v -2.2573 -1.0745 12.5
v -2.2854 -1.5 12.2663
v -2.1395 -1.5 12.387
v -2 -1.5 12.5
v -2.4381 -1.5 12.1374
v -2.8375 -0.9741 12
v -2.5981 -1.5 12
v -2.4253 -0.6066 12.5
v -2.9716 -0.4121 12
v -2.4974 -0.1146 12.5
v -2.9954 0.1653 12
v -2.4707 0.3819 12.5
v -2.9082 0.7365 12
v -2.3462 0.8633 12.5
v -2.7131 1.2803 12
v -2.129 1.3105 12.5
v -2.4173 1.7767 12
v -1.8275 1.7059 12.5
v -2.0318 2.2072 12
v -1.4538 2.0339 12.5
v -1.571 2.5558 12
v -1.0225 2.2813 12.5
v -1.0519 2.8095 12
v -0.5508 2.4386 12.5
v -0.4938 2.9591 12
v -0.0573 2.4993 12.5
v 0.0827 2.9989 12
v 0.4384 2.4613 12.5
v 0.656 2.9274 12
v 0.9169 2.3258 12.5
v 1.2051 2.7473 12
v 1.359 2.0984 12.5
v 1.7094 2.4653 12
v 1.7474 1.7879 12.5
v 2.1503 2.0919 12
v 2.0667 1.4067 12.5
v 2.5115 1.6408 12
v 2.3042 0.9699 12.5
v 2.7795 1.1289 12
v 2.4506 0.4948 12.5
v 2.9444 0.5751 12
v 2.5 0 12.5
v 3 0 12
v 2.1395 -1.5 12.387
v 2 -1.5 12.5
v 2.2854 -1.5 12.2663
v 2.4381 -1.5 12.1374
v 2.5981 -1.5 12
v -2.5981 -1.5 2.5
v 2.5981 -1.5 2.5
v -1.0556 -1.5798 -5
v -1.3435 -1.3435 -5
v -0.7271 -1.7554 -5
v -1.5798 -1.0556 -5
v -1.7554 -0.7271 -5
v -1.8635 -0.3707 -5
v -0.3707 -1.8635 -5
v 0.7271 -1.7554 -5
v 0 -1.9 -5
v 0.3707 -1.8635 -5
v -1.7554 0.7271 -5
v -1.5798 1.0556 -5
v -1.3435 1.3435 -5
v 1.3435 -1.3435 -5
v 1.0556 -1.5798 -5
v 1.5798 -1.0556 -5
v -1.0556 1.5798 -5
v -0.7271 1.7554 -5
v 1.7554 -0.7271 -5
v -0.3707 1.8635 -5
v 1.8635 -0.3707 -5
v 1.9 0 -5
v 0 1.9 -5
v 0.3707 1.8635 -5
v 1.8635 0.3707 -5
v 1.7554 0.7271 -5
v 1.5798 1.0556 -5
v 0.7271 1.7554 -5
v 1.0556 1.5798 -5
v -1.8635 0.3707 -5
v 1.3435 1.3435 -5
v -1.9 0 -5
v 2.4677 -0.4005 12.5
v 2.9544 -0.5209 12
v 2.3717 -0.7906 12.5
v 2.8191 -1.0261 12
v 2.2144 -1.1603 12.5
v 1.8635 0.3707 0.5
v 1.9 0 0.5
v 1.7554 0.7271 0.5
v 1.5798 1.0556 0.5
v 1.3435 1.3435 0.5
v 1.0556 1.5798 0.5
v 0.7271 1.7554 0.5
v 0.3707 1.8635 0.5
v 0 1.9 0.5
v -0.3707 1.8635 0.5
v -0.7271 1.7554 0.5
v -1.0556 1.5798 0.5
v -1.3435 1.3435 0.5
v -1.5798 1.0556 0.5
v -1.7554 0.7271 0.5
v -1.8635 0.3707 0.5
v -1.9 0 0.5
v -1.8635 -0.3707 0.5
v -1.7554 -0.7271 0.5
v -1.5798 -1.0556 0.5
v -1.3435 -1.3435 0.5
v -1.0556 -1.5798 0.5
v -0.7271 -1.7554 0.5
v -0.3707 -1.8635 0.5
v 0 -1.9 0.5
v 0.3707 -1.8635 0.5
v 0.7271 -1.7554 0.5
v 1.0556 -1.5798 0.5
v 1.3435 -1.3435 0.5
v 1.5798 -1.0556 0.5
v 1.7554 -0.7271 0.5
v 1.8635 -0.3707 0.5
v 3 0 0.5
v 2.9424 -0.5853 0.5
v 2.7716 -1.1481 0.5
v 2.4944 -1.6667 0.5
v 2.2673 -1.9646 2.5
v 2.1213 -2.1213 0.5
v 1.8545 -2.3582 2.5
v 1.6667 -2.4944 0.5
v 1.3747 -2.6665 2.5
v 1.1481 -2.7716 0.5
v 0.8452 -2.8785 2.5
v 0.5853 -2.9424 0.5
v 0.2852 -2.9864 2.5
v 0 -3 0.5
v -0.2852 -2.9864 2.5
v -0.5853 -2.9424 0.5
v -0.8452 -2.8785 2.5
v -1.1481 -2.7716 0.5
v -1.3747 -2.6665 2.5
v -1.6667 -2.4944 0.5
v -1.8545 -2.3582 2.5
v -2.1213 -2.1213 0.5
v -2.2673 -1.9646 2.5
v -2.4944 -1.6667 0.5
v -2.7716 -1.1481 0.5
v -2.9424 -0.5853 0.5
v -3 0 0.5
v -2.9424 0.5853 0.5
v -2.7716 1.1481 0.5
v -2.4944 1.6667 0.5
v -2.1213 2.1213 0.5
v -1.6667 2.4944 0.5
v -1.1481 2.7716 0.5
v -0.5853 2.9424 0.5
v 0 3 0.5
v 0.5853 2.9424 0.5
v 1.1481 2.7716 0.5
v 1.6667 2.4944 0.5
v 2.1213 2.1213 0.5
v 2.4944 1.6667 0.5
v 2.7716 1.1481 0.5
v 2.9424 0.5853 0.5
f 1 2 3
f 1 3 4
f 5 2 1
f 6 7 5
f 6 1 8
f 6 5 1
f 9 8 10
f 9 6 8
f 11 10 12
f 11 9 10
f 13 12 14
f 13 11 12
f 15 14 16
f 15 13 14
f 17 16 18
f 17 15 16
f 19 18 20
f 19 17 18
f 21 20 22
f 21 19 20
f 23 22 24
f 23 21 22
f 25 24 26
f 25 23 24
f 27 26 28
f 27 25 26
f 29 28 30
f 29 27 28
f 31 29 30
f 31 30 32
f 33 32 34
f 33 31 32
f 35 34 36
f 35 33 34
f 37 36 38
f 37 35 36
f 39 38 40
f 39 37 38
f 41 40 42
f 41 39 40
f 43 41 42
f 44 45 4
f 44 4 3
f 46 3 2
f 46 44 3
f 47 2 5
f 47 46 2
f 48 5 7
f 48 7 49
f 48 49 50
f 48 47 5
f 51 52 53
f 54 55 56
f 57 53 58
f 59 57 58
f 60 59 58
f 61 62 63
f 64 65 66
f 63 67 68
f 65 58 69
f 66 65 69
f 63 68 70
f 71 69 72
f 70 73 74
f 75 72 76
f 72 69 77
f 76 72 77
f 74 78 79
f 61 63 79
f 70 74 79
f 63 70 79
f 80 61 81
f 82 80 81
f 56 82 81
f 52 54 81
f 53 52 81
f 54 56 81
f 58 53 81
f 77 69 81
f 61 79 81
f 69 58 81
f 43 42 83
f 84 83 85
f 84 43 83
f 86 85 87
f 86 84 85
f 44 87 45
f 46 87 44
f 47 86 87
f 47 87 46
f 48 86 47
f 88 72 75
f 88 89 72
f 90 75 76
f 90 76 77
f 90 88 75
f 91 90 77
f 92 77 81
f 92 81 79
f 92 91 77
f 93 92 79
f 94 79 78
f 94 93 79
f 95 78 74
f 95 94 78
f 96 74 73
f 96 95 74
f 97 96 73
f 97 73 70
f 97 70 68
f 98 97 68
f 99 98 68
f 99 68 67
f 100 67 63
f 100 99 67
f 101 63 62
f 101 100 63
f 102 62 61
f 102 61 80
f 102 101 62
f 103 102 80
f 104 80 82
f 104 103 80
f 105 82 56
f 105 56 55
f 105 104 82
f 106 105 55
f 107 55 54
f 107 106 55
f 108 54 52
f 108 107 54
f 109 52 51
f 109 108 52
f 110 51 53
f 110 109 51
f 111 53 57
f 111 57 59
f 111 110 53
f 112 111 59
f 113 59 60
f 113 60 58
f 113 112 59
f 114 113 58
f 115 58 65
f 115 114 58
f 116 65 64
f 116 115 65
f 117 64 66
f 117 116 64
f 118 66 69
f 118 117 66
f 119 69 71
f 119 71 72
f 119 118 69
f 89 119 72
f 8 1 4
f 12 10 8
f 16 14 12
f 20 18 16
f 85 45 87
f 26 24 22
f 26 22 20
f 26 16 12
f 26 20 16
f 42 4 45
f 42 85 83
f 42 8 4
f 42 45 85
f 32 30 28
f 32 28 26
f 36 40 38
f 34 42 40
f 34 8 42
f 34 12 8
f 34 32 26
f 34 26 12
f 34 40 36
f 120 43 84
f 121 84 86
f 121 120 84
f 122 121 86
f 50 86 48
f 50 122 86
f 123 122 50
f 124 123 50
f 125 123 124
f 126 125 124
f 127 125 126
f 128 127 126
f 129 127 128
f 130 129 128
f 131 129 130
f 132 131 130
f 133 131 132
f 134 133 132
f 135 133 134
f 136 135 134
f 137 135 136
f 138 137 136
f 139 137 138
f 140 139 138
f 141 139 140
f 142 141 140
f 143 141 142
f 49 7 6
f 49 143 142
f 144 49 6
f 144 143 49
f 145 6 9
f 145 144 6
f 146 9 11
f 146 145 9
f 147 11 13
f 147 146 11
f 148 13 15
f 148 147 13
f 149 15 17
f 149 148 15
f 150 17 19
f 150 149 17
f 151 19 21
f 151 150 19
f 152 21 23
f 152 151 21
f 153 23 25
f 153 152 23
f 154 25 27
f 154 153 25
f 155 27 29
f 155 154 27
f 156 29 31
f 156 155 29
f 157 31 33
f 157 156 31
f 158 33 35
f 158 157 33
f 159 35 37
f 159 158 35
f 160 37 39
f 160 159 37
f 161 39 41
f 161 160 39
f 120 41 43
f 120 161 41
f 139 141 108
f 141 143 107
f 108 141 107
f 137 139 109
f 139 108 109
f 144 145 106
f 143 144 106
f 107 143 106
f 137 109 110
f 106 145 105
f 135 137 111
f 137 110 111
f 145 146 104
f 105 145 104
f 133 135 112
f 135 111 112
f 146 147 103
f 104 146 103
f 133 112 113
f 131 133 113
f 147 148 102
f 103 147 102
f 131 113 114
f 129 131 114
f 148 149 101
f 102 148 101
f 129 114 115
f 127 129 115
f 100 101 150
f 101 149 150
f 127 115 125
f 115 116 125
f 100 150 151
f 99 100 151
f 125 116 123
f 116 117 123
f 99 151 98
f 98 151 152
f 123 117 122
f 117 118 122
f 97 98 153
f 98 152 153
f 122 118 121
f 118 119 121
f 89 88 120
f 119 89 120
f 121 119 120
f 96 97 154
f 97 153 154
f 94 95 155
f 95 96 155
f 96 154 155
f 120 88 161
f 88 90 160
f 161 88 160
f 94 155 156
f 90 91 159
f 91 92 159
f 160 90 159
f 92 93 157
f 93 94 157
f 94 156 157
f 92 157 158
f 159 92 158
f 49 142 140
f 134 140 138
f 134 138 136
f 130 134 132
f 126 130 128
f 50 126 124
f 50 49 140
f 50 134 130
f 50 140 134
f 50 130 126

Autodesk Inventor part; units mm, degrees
ref_plane "YZ Plane" through (0, 0, 0) normal (1, 0, 0) x (0, 1, 0)
ref_plane "XZ Plane" through (0, 0, 0) normal (0, 1, 0) x (-1, 0, 0)
ref_plane "XY Plane" through (0, 0, 0) normal (0, 0, 1) x (1, 0, 0)
sketch "Sketch1" plane through (0, 0, 0) normal (0, 0, 1) x (1, 0, 0)
  circle A0 centre (0, 0) radius 2 projected
  circle A1 centre (0, 0) radius 3.5 projected
  circle A2 centre (0, 0) radius 1.9
  dimension "d0" = 3.8
extrude "Extrusion1" add sketch "Sketch1" against normal blind 5 and the other way blind 0.5 contours A2
sketch "Sketch2" plane through (0, 0, 0.5) normal (0, 0, 1) x (1, 0, 0)
  circle A0 centre (0, 0) radius 1.9 projected
  circle A1 centre (0, 0) radius 3
  dimension "d3" = 6
extrude "Extrusion2" add sketch "Sketch2" along normal blind 12 contours A0 | A1
sketch "Sketch3" plane through (0, 0, 12.5) normal (0, 0, 1) x (1, 0, 0)
  circle A0 centre (0, 0) radius 3 projected
  line L0 (-2.5981, -1.5) -> (2.5981, -1.5)
  dimension "d8" = 4.5
extrude "Extrusion3" cut sketch "Sketch3" against normal blind 10 contours L0 A0 picked at (-0.7274, -1.6862)
chamfer "Chamfer1" distance 0.5 angle 45 2 edges at (2.8978, -0.7765, 12.5) (-0.7765, 2.8978, 12.5)
properties part number "12mm Incremental Encoder Shaft"
